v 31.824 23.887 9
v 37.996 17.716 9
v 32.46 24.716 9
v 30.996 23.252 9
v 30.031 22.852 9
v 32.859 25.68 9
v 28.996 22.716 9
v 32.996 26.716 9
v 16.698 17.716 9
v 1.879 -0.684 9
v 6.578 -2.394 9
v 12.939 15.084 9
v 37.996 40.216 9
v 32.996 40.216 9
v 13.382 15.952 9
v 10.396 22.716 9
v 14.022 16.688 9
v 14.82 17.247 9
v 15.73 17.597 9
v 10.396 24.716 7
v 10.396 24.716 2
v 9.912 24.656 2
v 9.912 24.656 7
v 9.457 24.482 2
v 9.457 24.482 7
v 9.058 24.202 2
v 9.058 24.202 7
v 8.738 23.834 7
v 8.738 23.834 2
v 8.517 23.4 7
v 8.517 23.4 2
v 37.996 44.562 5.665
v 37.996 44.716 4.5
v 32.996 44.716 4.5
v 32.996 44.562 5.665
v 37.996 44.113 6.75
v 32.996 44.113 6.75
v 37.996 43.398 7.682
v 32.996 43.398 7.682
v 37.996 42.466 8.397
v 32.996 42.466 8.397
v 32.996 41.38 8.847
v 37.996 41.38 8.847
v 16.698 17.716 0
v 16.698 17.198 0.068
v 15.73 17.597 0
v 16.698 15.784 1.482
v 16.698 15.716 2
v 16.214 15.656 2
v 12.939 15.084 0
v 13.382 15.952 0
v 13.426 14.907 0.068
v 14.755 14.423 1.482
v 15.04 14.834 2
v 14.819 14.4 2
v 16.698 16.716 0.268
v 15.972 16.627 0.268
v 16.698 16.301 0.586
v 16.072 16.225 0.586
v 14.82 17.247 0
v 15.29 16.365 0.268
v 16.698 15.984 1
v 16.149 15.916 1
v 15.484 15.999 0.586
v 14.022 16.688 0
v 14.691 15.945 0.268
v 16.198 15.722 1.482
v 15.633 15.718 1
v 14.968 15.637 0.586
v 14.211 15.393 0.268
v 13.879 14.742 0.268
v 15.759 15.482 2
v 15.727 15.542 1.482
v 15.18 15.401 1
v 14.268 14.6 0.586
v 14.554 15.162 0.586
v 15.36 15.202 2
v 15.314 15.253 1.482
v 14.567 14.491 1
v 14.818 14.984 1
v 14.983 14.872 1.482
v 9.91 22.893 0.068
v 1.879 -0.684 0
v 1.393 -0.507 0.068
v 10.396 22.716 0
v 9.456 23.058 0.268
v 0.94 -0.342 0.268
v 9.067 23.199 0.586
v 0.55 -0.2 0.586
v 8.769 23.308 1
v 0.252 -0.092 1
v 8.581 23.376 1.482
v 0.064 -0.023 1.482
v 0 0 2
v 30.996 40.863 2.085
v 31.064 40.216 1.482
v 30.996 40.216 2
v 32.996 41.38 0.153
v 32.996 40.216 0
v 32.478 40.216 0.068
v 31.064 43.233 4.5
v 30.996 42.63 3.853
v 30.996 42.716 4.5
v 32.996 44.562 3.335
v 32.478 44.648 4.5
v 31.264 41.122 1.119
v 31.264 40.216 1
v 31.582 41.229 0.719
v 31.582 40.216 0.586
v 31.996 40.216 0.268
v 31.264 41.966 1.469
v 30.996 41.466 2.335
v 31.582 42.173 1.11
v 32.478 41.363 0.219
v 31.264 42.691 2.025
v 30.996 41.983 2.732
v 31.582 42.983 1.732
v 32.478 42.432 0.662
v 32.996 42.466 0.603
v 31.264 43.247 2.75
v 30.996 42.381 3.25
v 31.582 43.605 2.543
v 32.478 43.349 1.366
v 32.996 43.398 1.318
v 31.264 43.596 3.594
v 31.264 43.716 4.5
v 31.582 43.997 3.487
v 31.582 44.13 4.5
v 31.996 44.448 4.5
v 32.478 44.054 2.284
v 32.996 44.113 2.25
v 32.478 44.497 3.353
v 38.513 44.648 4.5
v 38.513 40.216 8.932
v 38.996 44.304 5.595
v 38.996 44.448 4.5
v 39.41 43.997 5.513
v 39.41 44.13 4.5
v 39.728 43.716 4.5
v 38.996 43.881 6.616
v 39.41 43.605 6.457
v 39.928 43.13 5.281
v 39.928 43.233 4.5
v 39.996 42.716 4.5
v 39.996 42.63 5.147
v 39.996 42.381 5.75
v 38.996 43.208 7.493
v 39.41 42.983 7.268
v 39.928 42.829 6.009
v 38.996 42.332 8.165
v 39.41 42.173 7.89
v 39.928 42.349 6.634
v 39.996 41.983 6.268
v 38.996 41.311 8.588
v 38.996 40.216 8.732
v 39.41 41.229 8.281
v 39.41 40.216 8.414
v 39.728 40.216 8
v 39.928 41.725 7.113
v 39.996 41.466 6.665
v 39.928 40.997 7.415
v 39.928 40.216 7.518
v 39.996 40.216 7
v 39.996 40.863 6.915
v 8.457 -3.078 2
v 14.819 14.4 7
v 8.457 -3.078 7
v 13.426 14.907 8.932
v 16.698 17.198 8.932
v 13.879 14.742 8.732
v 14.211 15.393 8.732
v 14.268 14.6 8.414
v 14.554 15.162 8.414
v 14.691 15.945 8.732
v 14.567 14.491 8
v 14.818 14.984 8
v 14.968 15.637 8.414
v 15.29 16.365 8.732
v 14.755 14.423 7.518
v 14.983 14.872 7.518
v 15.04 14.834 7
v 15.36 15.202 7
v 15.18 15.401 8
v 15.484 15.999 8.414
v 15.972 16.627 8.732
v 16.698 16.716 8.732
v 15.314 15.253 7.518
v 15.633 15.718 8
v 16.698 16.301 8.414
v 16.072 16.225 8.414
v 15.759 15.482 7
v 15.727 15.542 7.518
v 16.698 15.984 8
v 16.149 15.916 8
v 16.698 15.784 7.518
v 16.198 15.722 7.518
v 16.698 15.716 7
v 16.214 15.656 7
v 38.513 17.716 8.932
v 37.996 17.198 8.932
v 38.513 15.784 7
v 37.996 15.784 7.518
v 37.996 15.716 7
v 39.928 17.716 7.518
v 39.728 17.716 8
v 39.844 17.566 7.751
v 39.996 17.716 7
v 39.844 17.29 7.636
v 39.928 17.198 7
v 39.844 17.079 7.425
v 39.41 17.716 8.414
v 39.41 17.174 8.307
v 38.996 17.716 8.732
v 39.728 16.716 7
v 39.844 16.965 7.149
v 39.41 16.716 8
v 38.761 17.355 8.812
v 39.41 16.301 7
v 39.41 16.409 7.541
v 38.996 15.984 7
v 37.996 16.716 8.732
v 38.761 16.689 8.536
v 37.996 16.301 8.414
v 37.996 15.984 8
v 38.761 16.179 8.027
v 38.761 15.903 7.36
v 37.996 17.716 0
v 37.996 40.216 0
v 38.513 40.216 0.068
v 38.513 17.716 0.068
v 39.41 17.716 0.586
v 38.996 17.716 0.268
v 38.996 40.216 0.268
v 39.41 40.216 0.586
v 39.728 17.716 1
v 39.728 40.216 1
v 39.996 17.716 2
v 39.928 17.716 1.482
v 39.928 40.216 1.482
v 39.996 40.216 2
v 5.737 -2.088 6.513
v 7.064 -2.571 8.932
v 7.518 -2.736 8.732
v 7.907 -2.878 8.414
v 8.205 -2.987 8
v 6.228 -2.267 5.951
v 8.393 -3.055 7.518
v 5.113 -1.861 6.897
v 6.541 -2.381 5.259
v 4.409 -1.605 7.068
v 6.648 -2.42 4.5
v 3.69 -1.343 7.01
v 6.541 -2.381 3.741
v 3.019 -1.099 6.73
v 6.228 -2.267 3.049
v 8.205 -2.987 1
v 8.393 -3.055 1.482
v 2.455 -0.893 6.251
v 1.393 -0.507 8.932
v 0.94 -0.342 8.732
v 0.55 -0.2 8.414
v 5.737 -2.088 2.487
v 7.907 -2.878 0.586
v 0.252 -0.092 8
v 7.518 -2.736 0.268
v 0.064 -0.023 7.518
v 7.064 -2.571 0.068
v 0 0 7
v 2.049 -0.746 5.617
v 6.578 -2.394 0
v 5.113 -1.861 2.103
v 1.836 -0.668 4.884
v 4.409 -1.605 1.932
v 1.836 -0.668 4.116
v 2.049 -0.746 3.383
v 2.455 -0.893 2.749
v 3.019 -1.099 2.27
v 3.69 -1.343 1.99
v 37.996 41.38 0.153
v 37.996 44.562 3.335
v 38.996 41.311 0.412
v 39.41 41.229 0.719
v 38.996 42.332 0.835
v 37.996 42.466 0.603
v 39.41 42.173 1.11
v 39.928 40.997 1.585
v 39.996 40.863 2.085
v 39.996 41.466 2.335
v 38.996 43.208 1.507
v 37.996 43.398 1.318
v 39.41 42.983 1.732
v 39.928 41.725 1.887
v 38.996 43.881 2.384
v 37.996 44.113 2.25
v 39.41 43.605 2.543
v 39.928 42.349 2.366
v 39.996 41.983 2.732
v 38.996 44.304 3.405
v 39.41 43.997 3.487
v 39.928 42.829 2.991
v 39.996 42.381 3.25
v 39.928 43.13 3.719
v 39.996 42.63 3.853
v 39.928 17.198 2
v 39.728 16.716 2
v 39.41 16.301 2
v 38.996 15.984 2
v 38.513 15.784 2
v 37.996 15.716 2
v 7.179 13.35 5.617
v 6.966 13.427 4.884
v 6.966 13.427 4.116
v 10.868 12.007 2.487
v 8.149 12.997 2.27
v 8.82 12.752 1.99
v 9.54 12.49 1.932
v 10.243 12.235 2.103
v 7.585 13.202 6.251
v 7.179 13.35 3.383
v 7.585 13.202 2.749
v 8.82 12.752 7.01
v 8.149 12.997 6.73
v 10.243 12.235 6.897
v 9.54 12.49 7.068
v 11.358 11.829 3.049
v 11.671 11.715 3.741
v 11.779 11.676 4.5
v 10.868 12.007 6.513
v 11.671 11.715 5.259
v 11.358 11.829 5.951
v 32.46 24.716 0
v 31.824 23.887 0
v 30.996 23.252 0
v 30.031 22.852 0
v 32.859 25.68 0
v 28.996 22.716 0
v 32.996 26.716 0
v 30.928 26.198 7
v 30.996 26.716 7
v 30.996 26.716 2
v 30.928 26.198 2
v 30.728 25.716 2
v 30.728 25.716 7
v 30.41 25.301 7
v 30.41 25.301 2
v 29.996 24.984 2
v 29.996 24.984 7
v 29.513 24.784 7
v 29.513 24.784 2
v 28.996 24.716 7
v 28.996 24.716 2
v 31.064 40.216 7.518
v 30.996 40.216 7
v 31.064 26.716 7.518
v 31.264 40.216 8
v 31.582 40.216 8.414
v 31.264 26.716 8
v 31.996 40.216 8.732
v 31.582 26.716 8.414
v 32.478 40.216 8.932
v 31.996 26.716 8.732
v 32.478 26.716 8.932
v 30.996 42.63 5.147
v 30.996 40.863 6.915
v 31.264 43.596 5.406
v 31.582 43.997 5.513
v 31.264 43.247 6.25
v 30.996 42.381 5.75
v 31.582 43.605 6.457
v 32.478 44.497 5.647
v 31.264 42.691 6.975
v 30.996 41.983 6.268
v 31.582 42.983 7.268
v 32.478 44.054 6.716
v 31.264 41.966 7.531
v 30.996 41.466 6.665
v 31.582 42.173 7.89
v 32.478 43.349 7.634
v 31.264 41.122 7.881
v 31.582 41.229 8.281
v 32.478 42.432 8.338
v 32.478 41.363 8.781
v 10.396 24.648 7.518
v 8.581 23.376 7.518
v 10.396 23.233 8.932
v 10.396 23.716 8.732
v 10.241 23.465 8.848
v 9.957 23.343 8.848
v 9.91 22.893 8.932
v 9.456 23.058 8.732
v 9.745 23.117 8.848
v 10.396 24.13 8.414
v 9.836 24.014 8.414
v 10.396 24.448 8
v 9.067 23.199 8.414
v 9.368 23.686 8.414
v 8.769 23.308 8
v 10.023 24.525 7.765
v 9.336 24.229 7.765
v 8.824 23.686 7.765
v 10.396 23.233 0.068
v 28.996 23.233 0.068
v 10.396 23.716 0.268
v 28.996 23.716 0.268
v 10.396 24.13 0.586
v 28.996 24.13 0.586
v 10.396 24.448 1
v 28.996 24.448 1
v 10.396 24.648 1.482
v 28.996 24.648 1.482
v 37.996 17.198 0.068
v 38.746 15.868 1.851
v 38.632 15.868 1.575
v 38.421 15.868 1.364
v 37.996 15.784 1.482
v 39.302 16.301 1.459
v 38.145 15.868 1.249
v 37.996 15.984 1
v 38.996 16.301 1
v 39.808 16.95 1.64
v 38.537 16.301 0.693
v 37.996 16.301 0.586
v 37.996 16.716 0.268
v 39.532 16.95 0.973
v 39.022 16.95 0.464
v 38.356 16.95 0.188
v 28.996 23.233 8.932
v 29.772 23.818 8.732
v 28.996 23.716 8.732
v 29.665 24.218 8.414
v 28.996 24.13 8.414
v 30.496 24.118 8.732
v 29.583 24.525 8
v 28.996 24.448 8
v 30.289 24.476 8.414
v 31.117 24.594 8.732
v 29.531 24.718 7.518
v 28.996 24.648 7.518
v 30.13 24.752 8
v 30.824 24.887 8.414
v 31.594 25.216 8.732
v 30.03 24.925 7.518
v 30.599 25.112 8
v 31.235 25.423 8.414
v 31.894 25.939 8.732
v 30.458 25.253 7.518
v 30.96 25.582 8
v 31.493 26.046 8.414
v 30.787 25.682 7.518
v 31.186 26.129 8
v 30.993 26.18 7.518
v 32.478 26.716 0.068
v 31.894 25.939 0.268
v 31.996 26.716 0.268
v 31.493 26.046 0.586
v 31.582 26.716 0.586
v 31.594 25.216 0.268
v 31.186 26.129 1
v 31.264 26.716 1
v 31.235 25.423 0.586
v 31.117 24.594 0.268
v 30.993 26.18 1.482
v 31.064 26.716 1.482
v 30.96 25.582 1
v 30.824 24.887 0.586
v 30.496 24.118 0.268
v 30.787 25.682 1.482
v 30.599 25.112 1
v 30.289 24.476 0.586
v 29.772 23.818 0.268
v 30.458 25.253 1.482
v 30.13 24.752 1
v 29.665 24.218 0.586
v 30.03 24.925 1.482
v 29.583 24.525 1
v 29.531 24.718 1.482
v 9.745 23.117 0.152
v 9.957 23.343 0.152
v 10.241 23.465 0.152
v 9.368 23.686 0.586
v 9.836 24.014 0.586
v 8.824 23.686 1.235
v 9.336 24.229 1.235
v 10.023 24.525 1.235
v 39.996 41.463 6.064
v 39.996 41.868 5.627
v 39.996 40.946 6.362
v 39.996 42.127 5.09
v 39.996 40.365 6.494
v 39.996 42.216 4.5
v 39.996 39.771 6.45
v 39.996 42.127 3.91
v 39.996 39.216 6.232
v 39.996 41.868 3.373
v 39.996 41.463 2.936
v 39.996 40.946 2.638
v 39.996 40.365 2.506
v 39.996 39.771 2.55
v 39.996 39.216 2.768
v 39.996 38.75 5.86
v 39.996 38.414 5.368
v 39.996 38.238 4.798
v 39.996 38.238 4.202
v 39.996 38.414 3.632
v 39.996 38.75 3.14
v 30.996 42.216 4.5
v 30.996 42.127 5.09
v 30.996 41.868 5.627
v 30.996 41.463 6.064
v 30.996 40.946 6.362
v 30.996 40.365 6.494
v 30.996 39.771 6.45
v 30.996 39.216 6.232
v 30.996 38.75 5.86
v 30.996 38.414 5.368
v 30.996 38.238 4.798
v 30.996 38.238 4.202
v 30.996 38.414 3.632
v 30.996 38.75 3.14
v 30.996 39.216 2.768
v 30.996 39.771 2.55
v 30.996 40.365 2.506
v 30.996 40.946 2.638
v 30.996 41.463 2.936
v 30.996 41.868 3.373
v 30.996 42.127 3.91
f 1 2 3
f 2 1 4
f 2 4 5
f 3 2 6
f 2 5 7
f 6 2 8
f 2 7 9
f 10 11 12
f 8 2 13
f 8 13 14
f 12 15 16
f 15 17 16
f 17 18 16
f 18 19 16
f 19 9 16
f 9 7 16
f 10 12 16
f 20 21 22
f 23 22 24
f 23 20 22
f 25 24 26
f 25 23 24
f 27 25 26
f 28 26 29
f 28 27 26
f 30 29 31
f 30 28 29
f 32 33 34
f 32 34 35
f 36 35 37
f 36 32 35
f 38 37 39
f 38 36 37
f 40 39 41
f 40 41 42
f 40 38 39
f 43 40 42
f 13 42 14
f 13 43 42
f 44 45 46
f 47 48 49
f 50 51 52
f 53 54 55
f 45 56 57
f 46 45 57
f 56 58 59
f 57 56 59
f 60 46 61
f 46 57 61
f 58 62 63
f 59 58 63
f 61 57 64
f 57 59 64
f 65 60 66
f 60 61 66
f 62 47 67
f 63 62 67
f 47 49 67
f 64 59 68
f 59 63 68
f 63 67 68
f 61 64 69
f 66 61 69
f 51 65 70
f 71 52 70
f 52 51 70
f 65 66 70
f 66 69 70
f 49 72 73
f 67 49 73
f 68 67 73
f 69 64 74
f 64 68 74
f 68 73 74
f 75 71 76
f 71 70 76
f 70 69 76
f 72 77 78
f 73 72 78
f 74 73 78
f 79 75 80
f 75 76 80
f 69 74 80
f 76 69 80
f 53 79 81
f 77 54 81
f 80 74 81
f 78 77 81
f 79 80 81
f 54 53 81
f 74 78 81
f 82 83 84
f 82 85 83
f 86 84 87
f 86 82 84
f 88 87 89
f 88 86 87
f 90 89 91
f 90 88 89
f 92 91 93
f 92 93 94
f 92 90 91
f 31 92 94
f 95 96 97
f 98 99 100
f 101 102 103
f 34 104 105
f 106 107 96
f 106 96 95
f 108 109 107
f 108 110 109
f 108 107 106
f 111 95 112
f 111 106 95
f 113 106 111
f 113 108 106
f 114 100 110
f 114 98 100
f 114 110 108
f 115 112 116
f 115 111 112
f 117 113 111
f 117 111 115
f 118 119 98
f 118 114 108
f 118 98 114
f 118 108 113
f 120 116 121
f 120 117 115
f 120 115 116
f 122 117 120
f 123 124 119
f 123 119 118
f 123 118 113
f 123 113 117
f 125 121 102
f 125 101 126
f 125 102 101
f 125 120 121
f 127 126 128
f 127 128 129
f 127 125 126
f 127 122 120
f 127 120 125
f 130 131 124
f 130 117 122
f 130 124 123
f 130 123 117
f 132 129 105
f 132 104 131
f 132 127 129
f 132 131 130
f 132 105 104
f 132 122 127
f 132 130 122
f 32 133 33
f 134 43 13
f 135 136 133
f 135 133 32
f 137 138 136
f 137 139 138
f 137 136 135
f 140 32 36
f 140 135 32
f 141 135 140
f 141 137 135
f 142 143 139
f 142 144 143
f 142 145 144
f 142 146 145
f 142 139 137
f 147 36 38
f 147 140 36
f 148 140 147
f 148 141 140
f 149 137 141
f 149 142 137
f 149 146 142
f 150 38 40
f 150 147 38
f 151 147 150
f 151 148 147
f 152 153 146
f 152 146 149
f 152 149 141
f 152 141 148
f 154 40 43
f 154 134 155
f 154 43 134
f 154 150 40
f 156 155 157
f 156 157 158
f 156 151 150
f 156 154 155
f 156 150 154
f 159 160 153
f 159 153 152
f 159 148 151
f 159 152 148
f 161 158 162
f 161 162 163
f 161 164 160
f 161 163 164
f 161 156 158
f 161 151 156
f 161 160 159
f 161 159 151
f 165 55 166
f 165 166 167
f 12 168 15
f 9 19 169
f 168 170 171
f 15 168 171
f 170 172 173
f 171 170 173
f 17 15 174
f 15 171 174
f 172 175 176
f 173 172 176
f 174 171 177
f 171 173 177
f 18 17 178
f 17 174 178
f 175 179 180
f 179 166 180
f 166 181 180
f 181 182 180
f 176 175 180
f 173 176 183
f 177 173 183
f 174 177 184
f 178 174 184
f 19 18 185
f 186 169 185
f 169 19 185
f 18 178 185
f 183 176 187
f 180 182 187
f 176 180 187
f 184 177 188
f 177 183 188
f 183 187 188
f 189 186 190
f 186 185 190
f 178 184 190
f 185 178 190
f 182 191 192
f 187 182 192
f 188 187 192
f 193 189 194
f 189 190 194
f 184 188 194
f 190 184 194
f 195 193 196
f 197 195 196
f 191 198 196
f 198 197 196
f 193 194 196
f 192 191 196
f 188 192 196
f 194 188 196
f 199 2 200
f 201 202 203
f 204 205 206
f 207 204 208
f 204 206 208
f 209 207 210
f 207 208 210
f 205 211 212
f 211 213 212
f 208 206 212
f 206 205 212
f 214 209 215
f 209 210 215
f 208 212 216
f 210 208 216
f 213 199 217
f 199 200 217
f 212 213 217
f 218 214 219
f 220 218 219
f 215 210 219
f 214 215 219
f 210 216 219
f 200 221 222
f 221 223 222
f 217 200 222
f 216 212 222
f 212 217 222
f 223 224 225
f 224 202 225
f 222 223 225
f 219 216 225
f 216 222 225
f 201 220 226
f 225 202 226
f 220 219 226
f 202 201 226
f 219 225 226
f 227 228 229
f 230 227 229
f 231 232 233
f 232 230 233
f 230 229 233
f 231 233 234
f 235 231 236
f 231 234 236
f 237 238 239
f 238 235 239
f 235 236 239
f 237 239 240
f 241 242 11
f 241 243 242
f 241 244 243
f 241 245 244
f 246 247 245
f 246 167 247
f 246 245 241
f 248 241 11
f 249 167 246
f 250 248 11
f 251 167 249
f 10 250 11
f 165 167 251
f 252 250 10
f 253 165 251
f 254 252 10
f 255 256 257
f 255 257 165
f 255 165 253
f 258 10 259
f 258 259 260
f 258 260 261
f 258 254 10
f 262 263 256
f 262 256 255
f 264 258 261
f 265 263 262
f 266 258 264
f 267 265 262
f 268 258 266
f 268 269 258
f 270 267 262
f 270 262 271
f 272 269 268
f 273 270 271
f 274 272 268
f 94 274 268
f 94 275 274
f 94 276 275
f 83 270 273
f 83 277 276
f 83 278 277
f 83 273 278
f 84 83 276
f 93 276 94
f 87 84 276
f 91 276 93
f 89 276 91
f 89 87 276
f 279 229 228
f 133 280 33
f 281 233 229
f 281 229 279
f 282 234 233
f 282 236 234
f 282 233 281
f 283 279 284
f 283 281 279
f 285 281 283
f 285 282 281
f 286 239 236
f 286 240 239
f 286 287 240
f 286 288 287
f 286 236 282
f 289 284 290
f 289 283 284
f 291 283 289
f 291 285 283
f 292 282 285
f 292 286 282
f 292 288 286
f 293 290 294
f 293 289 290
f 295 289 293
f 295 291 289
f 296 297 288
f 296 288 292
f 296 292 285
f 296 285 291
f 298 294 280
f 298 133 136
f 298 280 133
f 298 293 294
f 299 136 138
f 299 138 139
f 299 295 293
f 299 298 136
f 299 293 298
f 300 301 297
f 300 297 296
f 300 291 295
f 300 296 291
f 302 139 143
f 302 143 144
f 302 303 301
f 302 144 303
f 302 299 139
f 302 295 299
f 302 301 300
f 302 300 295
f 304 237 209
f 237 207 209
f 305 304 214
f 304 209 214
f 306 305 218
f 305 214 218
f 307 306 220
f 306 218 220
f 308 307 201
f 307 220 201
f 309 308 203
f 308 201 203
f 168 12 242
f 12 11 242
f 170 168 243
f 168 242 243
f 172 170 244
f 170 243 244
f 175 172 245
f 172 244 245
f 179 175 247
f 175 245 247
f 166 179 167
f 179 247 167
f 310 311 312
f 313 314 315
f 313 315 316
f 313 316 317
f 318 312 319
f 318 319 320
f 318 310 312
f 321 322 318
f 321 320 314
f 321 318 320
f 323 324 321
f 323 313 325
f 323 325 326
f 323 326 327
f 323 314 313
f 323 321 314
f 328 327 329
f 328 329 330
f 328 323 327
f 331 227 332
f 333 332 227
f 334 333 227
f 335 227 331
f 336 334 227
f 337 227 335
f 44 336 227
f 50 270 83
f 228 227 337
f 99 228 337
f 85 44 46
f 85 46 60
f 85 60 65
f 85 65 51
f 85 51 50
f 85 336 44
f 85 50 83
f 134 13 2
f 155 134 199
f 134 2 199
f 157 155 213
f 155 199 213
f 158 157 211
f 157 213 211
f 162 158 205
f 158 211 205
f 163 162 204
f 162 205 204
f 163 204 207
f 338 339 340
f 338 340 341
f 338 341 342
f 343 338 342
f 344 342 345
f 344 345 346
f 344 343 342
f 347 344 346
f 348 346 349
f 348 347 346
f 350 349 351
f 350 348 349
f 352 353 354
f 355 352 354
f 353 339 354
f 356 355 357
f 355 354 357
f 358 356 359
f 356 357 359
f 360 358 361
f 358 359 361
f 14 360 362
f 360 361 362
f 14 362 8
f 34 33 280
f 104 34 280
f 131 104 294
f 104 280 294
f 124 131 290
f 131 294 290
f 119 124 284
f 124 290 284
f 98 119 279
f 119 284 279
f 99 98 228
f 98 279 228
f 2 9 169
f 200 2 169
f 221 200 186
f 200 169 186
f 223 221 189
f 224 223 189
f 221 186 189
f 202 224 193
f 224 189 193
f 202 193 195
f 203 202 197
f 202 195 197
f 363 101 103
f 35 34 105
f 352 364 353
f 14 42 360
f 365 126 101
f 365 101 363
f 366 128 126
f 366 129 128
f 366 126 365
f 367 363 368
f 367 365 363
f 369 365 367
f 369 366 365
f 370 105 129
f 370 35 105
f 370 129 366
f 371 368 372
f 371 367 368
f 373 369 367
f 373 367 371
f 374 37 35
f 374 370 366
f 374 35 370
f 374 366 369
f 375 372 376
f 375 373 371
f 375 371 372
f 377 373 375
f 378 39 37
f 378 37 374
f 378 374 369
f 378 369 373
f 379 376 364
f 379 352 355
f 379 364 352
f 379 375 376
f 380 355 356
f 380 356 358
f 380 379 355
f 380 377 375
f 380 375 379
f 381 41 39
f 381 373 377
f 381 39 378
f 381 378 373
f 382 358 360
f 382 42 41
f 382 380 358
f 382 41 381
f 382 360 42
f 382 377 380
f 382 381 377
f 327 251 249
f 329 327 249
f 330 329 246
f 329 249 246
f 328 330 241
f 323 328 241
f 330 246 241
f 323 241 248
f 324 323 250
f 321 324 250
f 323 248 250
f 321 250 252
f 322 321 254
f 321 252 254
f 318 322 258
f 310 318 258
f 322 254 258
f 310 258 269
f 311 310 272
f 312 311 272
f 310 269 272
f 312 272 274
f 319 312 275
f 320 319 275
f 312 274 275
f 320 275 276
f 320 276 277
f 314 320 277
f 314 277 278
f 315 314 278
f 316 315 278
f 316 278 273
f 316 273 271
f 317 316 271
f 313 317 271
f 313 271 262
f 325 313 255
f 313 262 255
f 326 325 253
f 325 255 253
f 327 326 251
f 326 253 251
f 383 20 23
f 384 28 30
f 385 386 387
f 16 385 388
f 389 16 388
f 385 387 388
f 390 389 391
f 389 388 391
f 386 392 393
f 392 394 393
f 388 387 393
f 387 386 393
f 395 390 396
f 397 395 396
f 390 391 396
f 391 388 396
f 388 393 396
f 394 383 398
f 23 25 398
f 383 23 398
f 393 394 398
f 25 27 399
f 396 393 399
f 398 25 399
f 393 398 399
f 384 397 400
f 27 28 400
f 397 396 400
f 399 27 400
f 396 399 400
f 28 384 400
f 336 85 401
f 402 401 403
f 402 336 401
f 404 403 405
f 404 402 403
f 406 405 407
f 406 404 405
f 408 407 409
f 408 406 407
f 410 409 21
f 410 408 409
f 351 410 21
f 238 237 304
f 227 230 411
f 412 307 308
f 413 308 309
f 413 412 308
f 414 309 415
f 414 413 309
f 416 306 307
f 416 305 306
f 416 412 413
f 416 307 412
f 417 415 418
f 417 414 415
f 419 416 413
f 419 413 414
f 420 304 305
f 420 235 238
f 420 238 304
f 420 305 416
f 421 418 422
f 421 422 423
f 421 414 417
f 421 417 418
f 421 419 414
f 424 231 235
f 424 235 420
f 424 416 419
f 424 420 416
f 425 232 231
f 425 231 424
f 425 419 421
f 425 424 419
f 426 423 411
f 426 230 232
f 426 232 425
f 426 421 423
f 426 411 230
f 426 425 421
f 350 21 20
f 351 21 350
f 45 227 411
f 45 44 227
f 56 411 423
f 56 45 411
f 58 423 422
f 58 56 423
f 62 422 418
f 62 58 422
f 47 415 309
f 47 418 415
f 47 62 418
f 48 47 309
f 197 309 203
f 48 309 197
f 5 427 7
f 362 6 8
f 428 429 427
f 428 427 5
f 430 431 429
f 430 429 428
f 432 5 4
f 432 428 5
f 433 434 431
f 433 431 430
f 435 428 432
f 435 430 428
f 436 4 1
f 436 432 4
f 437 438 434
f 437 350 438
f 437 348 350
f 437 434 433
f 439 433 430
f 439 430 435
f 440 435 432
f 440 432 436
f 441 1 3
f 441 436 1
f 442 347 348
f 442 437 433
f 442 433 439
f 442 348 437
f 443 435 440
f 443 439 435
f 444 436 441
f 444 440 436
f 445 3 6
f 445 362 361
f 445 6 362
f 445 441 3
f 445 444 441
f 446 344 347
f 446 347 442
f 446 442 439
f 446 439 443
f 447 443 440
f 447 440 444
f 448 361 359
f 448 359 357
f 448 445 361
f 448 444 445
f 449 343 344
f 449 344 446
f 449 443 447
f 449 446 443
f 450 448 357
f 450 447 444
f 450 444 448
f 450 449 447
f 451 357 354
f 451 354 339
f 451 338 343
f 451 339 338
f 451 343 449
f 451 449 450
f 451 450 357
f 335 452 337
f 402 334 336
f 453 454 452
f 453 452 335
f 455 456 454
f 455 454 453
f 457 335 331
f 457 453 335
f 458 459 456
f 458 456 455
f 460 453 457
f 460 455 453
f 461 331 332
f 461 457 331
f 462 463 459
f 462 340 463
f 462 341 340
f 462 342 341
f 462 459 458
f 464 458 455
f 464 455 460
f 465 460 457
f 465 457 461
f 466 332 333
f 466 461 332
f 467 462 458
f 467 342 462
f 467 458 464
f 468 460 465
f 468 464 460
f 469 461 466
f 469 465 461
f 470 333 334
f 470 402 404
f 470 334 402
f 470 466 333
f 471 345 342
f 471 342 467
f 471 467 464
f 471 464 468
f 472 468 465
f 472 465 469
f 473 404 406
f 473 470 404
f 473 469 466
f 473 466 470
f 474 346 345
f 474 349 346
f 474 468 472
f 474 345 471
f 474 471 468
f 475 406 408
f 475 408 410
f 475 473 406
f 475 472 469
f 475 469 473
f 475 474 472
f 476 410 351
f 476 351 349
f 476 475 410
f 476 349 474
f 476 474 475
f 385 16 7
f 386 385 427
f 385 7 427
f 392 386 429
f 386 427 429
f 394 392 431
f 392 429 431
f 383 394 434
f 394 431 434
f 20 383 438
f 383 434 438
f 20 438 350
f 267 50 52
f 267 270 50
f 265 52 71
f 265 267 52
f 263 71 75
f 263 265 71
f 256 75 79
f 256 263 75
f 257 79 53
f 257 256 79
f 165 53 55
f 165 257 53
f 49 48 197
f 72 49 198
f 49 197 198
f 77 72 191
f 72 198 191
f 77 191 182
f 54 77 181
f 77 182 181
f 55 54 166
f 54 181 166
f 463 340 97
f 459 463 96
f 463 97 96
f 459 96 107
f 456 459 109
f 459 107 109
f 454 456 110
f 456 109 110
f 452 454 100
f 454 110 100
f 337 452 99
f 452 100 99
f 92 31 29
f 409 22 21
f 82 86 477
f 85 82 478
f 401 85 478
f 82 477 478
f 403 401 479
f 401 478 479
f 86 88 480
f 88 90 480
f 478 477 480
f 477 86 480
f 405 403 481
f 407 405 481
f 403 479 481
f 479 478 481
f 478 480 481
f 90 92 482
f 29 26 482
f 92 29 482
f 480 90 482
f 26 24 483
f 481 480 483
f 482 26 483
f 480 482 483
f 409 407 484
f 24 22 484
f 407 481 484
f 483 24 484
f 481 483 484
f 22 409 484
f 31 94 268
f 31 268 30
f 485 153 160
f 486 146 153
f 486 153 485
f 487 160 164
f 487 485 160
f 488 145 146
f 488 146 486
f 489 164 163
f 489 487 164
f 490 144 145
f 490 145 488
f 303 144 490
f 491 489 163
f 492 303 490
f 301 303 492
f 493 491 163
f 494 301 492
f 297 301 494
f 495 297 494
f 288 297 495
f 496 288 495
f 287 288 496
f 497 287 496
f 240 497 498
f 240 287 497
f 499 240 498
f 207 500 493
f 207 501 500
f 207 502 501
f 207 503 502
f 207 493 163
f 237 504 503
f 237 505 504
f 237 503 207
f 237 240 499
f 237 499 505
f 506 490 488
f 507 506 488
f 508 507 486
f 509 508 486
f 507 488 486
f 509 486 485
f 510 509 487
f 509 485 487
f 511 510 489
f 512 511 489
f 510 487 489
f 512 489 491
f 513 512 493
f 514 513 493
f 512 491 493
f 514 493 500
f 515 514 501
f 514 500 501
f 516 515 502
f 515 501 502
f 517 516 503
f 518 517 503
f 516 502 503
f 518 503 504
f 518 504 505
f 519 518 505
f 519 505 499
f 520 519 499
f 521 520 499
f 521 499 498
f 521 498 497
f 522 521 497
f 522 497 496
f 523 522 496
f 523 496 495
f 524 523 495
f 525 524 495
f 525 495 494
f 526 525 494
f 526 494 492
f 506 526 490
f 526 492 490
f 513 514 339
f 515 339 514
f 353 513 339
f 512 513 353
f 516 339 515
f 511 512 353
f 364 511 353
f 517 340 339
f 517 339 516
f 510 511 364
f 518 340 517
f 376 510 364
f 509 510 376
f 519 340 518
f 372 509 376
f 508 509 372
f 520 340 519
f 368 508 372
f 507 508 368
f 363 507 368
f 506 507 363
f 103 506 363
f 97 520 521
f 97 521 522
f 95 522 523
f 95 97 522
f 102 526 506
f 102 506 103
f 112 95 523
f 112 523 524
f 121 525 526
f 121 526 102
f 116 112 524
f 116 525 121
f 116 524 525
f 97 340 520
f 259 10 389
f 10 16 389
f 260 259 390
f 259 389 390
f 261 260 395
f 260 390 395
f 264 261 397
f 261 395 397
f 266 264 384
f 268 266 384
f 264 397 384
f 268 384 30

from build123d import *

# Parameters (mm, degrees)
Y_KSEKLIK_EKSTR_ZYON1_DEPTH = 9
RADYUS1_R                   = 4.5
IZIM2_R                     = 2
KES_EKSTR_ZYON1_DEPTH       = 9
IZIM3_R                     = 2.575
KES_EKSTR_ZYON2_DEPTH       = 15
RADYUS2_R                   = 2


with BuildPart() as part:
    # Çizim1 → Yükseklik-Ekstrüzyon1 (new body)
    with BuildSketch(Plane.XY):
        Polygon((0, 0), (8.99576861, 24.715671126), (30.99576861, 24.715671126), (30.99576861, 44.715671126), (39.99576861, 44.715671126), (39.99576861, 15.715671126), (15.297636454, 15.715671126), (8.457233587, -3.07818129), align=None)
    extrude(amount=Y_KSEKLIK_EKSTR_ZYON1_DEPTH)

    # Radyus1
    radyus1_edges = [part.edges().sort_by_distance(p)[0] for p in [
        (35.49576861, 44.715671126, 0),
        (35.49576861, 44.715671126, 9),
    ]]
    fillet(radyus1_edges, radius=RADYUS1_R - 0.0001)  # a hair under: the kernel refuses the full size

    # Çizim2 → Kes-Ekstrüzyon1 (cut)
    with BuildSketch(Plane(origin=(39.99576861, 0, 0), x_dir=(0, 0, -1), z_dir=(1, 0, 0))):
        with Locations(Location((-4.5, 40.215671126, 0), (0, 0, 90))):
            Circle(IZIM2_R)
    extrude(amount=-KES_EKSTR_ZYON1_DEPTH, mode=Mode.SUBTRACT)

    # Çizim3 → Kes-Ekstrüzyon2 (cut)
    with BuildSketch(Plane(origin=(0, 0, 0), x_dir=(0.9396926207859082, -0.34202014332566943, 0), z_dir=(-0.34202014332566943, -0.9396926207859082, 0))):
        with Locations((4.5, 4.5)):
            Circle(IZIM3_R)
    extrude(amount=-KES_EKSTR_ZYON2_DEPTH, mode=Mode.SUBTRACT)

    # Radyus2
    radyus2_edges = [part.edges().sort_by_distance(p)[0] for p in [
        (27.646702532, 15.715671126, 9),
        (11.87743502, 6.318744918, 0),
        (39.99576861, 27.965721126, 9),
        (8.99576861, 24.715671126, 4.5),
        (30.99576861, 24.715671126, 4.5),
        (39.99576861, 15.715671126, 4.5),
        (15.297636454, 15.715671126, 4.5),
        (19.99576861, 24.715671126, 9),
        (30.99576861, 32.465721126, 0),
        (30.99576861, 32.465721126, 9),
        (30.99576861, 43.39768093, 7.682009805),
        (30.99576861, 43.39768093, 1.317990195),
        (4.497884305, 12.357835563, 9),
        (39.99576861, 43.39768093, 7.682009805),
        (39.99576861, 43.39768093, 1.317990195),
        (11.87743502, 6.318744918, 9),
        (4.497884305, 12.357835563, 0),
        (19.99576861, 24.715671126, 0),
        (39.99576861, 27.965721126, 0),
        (27.646702532, 15.715671126, 0),
    ]]
    fillet(radyus2_edges, radius=RADYUS2_R)


solid = part.part
